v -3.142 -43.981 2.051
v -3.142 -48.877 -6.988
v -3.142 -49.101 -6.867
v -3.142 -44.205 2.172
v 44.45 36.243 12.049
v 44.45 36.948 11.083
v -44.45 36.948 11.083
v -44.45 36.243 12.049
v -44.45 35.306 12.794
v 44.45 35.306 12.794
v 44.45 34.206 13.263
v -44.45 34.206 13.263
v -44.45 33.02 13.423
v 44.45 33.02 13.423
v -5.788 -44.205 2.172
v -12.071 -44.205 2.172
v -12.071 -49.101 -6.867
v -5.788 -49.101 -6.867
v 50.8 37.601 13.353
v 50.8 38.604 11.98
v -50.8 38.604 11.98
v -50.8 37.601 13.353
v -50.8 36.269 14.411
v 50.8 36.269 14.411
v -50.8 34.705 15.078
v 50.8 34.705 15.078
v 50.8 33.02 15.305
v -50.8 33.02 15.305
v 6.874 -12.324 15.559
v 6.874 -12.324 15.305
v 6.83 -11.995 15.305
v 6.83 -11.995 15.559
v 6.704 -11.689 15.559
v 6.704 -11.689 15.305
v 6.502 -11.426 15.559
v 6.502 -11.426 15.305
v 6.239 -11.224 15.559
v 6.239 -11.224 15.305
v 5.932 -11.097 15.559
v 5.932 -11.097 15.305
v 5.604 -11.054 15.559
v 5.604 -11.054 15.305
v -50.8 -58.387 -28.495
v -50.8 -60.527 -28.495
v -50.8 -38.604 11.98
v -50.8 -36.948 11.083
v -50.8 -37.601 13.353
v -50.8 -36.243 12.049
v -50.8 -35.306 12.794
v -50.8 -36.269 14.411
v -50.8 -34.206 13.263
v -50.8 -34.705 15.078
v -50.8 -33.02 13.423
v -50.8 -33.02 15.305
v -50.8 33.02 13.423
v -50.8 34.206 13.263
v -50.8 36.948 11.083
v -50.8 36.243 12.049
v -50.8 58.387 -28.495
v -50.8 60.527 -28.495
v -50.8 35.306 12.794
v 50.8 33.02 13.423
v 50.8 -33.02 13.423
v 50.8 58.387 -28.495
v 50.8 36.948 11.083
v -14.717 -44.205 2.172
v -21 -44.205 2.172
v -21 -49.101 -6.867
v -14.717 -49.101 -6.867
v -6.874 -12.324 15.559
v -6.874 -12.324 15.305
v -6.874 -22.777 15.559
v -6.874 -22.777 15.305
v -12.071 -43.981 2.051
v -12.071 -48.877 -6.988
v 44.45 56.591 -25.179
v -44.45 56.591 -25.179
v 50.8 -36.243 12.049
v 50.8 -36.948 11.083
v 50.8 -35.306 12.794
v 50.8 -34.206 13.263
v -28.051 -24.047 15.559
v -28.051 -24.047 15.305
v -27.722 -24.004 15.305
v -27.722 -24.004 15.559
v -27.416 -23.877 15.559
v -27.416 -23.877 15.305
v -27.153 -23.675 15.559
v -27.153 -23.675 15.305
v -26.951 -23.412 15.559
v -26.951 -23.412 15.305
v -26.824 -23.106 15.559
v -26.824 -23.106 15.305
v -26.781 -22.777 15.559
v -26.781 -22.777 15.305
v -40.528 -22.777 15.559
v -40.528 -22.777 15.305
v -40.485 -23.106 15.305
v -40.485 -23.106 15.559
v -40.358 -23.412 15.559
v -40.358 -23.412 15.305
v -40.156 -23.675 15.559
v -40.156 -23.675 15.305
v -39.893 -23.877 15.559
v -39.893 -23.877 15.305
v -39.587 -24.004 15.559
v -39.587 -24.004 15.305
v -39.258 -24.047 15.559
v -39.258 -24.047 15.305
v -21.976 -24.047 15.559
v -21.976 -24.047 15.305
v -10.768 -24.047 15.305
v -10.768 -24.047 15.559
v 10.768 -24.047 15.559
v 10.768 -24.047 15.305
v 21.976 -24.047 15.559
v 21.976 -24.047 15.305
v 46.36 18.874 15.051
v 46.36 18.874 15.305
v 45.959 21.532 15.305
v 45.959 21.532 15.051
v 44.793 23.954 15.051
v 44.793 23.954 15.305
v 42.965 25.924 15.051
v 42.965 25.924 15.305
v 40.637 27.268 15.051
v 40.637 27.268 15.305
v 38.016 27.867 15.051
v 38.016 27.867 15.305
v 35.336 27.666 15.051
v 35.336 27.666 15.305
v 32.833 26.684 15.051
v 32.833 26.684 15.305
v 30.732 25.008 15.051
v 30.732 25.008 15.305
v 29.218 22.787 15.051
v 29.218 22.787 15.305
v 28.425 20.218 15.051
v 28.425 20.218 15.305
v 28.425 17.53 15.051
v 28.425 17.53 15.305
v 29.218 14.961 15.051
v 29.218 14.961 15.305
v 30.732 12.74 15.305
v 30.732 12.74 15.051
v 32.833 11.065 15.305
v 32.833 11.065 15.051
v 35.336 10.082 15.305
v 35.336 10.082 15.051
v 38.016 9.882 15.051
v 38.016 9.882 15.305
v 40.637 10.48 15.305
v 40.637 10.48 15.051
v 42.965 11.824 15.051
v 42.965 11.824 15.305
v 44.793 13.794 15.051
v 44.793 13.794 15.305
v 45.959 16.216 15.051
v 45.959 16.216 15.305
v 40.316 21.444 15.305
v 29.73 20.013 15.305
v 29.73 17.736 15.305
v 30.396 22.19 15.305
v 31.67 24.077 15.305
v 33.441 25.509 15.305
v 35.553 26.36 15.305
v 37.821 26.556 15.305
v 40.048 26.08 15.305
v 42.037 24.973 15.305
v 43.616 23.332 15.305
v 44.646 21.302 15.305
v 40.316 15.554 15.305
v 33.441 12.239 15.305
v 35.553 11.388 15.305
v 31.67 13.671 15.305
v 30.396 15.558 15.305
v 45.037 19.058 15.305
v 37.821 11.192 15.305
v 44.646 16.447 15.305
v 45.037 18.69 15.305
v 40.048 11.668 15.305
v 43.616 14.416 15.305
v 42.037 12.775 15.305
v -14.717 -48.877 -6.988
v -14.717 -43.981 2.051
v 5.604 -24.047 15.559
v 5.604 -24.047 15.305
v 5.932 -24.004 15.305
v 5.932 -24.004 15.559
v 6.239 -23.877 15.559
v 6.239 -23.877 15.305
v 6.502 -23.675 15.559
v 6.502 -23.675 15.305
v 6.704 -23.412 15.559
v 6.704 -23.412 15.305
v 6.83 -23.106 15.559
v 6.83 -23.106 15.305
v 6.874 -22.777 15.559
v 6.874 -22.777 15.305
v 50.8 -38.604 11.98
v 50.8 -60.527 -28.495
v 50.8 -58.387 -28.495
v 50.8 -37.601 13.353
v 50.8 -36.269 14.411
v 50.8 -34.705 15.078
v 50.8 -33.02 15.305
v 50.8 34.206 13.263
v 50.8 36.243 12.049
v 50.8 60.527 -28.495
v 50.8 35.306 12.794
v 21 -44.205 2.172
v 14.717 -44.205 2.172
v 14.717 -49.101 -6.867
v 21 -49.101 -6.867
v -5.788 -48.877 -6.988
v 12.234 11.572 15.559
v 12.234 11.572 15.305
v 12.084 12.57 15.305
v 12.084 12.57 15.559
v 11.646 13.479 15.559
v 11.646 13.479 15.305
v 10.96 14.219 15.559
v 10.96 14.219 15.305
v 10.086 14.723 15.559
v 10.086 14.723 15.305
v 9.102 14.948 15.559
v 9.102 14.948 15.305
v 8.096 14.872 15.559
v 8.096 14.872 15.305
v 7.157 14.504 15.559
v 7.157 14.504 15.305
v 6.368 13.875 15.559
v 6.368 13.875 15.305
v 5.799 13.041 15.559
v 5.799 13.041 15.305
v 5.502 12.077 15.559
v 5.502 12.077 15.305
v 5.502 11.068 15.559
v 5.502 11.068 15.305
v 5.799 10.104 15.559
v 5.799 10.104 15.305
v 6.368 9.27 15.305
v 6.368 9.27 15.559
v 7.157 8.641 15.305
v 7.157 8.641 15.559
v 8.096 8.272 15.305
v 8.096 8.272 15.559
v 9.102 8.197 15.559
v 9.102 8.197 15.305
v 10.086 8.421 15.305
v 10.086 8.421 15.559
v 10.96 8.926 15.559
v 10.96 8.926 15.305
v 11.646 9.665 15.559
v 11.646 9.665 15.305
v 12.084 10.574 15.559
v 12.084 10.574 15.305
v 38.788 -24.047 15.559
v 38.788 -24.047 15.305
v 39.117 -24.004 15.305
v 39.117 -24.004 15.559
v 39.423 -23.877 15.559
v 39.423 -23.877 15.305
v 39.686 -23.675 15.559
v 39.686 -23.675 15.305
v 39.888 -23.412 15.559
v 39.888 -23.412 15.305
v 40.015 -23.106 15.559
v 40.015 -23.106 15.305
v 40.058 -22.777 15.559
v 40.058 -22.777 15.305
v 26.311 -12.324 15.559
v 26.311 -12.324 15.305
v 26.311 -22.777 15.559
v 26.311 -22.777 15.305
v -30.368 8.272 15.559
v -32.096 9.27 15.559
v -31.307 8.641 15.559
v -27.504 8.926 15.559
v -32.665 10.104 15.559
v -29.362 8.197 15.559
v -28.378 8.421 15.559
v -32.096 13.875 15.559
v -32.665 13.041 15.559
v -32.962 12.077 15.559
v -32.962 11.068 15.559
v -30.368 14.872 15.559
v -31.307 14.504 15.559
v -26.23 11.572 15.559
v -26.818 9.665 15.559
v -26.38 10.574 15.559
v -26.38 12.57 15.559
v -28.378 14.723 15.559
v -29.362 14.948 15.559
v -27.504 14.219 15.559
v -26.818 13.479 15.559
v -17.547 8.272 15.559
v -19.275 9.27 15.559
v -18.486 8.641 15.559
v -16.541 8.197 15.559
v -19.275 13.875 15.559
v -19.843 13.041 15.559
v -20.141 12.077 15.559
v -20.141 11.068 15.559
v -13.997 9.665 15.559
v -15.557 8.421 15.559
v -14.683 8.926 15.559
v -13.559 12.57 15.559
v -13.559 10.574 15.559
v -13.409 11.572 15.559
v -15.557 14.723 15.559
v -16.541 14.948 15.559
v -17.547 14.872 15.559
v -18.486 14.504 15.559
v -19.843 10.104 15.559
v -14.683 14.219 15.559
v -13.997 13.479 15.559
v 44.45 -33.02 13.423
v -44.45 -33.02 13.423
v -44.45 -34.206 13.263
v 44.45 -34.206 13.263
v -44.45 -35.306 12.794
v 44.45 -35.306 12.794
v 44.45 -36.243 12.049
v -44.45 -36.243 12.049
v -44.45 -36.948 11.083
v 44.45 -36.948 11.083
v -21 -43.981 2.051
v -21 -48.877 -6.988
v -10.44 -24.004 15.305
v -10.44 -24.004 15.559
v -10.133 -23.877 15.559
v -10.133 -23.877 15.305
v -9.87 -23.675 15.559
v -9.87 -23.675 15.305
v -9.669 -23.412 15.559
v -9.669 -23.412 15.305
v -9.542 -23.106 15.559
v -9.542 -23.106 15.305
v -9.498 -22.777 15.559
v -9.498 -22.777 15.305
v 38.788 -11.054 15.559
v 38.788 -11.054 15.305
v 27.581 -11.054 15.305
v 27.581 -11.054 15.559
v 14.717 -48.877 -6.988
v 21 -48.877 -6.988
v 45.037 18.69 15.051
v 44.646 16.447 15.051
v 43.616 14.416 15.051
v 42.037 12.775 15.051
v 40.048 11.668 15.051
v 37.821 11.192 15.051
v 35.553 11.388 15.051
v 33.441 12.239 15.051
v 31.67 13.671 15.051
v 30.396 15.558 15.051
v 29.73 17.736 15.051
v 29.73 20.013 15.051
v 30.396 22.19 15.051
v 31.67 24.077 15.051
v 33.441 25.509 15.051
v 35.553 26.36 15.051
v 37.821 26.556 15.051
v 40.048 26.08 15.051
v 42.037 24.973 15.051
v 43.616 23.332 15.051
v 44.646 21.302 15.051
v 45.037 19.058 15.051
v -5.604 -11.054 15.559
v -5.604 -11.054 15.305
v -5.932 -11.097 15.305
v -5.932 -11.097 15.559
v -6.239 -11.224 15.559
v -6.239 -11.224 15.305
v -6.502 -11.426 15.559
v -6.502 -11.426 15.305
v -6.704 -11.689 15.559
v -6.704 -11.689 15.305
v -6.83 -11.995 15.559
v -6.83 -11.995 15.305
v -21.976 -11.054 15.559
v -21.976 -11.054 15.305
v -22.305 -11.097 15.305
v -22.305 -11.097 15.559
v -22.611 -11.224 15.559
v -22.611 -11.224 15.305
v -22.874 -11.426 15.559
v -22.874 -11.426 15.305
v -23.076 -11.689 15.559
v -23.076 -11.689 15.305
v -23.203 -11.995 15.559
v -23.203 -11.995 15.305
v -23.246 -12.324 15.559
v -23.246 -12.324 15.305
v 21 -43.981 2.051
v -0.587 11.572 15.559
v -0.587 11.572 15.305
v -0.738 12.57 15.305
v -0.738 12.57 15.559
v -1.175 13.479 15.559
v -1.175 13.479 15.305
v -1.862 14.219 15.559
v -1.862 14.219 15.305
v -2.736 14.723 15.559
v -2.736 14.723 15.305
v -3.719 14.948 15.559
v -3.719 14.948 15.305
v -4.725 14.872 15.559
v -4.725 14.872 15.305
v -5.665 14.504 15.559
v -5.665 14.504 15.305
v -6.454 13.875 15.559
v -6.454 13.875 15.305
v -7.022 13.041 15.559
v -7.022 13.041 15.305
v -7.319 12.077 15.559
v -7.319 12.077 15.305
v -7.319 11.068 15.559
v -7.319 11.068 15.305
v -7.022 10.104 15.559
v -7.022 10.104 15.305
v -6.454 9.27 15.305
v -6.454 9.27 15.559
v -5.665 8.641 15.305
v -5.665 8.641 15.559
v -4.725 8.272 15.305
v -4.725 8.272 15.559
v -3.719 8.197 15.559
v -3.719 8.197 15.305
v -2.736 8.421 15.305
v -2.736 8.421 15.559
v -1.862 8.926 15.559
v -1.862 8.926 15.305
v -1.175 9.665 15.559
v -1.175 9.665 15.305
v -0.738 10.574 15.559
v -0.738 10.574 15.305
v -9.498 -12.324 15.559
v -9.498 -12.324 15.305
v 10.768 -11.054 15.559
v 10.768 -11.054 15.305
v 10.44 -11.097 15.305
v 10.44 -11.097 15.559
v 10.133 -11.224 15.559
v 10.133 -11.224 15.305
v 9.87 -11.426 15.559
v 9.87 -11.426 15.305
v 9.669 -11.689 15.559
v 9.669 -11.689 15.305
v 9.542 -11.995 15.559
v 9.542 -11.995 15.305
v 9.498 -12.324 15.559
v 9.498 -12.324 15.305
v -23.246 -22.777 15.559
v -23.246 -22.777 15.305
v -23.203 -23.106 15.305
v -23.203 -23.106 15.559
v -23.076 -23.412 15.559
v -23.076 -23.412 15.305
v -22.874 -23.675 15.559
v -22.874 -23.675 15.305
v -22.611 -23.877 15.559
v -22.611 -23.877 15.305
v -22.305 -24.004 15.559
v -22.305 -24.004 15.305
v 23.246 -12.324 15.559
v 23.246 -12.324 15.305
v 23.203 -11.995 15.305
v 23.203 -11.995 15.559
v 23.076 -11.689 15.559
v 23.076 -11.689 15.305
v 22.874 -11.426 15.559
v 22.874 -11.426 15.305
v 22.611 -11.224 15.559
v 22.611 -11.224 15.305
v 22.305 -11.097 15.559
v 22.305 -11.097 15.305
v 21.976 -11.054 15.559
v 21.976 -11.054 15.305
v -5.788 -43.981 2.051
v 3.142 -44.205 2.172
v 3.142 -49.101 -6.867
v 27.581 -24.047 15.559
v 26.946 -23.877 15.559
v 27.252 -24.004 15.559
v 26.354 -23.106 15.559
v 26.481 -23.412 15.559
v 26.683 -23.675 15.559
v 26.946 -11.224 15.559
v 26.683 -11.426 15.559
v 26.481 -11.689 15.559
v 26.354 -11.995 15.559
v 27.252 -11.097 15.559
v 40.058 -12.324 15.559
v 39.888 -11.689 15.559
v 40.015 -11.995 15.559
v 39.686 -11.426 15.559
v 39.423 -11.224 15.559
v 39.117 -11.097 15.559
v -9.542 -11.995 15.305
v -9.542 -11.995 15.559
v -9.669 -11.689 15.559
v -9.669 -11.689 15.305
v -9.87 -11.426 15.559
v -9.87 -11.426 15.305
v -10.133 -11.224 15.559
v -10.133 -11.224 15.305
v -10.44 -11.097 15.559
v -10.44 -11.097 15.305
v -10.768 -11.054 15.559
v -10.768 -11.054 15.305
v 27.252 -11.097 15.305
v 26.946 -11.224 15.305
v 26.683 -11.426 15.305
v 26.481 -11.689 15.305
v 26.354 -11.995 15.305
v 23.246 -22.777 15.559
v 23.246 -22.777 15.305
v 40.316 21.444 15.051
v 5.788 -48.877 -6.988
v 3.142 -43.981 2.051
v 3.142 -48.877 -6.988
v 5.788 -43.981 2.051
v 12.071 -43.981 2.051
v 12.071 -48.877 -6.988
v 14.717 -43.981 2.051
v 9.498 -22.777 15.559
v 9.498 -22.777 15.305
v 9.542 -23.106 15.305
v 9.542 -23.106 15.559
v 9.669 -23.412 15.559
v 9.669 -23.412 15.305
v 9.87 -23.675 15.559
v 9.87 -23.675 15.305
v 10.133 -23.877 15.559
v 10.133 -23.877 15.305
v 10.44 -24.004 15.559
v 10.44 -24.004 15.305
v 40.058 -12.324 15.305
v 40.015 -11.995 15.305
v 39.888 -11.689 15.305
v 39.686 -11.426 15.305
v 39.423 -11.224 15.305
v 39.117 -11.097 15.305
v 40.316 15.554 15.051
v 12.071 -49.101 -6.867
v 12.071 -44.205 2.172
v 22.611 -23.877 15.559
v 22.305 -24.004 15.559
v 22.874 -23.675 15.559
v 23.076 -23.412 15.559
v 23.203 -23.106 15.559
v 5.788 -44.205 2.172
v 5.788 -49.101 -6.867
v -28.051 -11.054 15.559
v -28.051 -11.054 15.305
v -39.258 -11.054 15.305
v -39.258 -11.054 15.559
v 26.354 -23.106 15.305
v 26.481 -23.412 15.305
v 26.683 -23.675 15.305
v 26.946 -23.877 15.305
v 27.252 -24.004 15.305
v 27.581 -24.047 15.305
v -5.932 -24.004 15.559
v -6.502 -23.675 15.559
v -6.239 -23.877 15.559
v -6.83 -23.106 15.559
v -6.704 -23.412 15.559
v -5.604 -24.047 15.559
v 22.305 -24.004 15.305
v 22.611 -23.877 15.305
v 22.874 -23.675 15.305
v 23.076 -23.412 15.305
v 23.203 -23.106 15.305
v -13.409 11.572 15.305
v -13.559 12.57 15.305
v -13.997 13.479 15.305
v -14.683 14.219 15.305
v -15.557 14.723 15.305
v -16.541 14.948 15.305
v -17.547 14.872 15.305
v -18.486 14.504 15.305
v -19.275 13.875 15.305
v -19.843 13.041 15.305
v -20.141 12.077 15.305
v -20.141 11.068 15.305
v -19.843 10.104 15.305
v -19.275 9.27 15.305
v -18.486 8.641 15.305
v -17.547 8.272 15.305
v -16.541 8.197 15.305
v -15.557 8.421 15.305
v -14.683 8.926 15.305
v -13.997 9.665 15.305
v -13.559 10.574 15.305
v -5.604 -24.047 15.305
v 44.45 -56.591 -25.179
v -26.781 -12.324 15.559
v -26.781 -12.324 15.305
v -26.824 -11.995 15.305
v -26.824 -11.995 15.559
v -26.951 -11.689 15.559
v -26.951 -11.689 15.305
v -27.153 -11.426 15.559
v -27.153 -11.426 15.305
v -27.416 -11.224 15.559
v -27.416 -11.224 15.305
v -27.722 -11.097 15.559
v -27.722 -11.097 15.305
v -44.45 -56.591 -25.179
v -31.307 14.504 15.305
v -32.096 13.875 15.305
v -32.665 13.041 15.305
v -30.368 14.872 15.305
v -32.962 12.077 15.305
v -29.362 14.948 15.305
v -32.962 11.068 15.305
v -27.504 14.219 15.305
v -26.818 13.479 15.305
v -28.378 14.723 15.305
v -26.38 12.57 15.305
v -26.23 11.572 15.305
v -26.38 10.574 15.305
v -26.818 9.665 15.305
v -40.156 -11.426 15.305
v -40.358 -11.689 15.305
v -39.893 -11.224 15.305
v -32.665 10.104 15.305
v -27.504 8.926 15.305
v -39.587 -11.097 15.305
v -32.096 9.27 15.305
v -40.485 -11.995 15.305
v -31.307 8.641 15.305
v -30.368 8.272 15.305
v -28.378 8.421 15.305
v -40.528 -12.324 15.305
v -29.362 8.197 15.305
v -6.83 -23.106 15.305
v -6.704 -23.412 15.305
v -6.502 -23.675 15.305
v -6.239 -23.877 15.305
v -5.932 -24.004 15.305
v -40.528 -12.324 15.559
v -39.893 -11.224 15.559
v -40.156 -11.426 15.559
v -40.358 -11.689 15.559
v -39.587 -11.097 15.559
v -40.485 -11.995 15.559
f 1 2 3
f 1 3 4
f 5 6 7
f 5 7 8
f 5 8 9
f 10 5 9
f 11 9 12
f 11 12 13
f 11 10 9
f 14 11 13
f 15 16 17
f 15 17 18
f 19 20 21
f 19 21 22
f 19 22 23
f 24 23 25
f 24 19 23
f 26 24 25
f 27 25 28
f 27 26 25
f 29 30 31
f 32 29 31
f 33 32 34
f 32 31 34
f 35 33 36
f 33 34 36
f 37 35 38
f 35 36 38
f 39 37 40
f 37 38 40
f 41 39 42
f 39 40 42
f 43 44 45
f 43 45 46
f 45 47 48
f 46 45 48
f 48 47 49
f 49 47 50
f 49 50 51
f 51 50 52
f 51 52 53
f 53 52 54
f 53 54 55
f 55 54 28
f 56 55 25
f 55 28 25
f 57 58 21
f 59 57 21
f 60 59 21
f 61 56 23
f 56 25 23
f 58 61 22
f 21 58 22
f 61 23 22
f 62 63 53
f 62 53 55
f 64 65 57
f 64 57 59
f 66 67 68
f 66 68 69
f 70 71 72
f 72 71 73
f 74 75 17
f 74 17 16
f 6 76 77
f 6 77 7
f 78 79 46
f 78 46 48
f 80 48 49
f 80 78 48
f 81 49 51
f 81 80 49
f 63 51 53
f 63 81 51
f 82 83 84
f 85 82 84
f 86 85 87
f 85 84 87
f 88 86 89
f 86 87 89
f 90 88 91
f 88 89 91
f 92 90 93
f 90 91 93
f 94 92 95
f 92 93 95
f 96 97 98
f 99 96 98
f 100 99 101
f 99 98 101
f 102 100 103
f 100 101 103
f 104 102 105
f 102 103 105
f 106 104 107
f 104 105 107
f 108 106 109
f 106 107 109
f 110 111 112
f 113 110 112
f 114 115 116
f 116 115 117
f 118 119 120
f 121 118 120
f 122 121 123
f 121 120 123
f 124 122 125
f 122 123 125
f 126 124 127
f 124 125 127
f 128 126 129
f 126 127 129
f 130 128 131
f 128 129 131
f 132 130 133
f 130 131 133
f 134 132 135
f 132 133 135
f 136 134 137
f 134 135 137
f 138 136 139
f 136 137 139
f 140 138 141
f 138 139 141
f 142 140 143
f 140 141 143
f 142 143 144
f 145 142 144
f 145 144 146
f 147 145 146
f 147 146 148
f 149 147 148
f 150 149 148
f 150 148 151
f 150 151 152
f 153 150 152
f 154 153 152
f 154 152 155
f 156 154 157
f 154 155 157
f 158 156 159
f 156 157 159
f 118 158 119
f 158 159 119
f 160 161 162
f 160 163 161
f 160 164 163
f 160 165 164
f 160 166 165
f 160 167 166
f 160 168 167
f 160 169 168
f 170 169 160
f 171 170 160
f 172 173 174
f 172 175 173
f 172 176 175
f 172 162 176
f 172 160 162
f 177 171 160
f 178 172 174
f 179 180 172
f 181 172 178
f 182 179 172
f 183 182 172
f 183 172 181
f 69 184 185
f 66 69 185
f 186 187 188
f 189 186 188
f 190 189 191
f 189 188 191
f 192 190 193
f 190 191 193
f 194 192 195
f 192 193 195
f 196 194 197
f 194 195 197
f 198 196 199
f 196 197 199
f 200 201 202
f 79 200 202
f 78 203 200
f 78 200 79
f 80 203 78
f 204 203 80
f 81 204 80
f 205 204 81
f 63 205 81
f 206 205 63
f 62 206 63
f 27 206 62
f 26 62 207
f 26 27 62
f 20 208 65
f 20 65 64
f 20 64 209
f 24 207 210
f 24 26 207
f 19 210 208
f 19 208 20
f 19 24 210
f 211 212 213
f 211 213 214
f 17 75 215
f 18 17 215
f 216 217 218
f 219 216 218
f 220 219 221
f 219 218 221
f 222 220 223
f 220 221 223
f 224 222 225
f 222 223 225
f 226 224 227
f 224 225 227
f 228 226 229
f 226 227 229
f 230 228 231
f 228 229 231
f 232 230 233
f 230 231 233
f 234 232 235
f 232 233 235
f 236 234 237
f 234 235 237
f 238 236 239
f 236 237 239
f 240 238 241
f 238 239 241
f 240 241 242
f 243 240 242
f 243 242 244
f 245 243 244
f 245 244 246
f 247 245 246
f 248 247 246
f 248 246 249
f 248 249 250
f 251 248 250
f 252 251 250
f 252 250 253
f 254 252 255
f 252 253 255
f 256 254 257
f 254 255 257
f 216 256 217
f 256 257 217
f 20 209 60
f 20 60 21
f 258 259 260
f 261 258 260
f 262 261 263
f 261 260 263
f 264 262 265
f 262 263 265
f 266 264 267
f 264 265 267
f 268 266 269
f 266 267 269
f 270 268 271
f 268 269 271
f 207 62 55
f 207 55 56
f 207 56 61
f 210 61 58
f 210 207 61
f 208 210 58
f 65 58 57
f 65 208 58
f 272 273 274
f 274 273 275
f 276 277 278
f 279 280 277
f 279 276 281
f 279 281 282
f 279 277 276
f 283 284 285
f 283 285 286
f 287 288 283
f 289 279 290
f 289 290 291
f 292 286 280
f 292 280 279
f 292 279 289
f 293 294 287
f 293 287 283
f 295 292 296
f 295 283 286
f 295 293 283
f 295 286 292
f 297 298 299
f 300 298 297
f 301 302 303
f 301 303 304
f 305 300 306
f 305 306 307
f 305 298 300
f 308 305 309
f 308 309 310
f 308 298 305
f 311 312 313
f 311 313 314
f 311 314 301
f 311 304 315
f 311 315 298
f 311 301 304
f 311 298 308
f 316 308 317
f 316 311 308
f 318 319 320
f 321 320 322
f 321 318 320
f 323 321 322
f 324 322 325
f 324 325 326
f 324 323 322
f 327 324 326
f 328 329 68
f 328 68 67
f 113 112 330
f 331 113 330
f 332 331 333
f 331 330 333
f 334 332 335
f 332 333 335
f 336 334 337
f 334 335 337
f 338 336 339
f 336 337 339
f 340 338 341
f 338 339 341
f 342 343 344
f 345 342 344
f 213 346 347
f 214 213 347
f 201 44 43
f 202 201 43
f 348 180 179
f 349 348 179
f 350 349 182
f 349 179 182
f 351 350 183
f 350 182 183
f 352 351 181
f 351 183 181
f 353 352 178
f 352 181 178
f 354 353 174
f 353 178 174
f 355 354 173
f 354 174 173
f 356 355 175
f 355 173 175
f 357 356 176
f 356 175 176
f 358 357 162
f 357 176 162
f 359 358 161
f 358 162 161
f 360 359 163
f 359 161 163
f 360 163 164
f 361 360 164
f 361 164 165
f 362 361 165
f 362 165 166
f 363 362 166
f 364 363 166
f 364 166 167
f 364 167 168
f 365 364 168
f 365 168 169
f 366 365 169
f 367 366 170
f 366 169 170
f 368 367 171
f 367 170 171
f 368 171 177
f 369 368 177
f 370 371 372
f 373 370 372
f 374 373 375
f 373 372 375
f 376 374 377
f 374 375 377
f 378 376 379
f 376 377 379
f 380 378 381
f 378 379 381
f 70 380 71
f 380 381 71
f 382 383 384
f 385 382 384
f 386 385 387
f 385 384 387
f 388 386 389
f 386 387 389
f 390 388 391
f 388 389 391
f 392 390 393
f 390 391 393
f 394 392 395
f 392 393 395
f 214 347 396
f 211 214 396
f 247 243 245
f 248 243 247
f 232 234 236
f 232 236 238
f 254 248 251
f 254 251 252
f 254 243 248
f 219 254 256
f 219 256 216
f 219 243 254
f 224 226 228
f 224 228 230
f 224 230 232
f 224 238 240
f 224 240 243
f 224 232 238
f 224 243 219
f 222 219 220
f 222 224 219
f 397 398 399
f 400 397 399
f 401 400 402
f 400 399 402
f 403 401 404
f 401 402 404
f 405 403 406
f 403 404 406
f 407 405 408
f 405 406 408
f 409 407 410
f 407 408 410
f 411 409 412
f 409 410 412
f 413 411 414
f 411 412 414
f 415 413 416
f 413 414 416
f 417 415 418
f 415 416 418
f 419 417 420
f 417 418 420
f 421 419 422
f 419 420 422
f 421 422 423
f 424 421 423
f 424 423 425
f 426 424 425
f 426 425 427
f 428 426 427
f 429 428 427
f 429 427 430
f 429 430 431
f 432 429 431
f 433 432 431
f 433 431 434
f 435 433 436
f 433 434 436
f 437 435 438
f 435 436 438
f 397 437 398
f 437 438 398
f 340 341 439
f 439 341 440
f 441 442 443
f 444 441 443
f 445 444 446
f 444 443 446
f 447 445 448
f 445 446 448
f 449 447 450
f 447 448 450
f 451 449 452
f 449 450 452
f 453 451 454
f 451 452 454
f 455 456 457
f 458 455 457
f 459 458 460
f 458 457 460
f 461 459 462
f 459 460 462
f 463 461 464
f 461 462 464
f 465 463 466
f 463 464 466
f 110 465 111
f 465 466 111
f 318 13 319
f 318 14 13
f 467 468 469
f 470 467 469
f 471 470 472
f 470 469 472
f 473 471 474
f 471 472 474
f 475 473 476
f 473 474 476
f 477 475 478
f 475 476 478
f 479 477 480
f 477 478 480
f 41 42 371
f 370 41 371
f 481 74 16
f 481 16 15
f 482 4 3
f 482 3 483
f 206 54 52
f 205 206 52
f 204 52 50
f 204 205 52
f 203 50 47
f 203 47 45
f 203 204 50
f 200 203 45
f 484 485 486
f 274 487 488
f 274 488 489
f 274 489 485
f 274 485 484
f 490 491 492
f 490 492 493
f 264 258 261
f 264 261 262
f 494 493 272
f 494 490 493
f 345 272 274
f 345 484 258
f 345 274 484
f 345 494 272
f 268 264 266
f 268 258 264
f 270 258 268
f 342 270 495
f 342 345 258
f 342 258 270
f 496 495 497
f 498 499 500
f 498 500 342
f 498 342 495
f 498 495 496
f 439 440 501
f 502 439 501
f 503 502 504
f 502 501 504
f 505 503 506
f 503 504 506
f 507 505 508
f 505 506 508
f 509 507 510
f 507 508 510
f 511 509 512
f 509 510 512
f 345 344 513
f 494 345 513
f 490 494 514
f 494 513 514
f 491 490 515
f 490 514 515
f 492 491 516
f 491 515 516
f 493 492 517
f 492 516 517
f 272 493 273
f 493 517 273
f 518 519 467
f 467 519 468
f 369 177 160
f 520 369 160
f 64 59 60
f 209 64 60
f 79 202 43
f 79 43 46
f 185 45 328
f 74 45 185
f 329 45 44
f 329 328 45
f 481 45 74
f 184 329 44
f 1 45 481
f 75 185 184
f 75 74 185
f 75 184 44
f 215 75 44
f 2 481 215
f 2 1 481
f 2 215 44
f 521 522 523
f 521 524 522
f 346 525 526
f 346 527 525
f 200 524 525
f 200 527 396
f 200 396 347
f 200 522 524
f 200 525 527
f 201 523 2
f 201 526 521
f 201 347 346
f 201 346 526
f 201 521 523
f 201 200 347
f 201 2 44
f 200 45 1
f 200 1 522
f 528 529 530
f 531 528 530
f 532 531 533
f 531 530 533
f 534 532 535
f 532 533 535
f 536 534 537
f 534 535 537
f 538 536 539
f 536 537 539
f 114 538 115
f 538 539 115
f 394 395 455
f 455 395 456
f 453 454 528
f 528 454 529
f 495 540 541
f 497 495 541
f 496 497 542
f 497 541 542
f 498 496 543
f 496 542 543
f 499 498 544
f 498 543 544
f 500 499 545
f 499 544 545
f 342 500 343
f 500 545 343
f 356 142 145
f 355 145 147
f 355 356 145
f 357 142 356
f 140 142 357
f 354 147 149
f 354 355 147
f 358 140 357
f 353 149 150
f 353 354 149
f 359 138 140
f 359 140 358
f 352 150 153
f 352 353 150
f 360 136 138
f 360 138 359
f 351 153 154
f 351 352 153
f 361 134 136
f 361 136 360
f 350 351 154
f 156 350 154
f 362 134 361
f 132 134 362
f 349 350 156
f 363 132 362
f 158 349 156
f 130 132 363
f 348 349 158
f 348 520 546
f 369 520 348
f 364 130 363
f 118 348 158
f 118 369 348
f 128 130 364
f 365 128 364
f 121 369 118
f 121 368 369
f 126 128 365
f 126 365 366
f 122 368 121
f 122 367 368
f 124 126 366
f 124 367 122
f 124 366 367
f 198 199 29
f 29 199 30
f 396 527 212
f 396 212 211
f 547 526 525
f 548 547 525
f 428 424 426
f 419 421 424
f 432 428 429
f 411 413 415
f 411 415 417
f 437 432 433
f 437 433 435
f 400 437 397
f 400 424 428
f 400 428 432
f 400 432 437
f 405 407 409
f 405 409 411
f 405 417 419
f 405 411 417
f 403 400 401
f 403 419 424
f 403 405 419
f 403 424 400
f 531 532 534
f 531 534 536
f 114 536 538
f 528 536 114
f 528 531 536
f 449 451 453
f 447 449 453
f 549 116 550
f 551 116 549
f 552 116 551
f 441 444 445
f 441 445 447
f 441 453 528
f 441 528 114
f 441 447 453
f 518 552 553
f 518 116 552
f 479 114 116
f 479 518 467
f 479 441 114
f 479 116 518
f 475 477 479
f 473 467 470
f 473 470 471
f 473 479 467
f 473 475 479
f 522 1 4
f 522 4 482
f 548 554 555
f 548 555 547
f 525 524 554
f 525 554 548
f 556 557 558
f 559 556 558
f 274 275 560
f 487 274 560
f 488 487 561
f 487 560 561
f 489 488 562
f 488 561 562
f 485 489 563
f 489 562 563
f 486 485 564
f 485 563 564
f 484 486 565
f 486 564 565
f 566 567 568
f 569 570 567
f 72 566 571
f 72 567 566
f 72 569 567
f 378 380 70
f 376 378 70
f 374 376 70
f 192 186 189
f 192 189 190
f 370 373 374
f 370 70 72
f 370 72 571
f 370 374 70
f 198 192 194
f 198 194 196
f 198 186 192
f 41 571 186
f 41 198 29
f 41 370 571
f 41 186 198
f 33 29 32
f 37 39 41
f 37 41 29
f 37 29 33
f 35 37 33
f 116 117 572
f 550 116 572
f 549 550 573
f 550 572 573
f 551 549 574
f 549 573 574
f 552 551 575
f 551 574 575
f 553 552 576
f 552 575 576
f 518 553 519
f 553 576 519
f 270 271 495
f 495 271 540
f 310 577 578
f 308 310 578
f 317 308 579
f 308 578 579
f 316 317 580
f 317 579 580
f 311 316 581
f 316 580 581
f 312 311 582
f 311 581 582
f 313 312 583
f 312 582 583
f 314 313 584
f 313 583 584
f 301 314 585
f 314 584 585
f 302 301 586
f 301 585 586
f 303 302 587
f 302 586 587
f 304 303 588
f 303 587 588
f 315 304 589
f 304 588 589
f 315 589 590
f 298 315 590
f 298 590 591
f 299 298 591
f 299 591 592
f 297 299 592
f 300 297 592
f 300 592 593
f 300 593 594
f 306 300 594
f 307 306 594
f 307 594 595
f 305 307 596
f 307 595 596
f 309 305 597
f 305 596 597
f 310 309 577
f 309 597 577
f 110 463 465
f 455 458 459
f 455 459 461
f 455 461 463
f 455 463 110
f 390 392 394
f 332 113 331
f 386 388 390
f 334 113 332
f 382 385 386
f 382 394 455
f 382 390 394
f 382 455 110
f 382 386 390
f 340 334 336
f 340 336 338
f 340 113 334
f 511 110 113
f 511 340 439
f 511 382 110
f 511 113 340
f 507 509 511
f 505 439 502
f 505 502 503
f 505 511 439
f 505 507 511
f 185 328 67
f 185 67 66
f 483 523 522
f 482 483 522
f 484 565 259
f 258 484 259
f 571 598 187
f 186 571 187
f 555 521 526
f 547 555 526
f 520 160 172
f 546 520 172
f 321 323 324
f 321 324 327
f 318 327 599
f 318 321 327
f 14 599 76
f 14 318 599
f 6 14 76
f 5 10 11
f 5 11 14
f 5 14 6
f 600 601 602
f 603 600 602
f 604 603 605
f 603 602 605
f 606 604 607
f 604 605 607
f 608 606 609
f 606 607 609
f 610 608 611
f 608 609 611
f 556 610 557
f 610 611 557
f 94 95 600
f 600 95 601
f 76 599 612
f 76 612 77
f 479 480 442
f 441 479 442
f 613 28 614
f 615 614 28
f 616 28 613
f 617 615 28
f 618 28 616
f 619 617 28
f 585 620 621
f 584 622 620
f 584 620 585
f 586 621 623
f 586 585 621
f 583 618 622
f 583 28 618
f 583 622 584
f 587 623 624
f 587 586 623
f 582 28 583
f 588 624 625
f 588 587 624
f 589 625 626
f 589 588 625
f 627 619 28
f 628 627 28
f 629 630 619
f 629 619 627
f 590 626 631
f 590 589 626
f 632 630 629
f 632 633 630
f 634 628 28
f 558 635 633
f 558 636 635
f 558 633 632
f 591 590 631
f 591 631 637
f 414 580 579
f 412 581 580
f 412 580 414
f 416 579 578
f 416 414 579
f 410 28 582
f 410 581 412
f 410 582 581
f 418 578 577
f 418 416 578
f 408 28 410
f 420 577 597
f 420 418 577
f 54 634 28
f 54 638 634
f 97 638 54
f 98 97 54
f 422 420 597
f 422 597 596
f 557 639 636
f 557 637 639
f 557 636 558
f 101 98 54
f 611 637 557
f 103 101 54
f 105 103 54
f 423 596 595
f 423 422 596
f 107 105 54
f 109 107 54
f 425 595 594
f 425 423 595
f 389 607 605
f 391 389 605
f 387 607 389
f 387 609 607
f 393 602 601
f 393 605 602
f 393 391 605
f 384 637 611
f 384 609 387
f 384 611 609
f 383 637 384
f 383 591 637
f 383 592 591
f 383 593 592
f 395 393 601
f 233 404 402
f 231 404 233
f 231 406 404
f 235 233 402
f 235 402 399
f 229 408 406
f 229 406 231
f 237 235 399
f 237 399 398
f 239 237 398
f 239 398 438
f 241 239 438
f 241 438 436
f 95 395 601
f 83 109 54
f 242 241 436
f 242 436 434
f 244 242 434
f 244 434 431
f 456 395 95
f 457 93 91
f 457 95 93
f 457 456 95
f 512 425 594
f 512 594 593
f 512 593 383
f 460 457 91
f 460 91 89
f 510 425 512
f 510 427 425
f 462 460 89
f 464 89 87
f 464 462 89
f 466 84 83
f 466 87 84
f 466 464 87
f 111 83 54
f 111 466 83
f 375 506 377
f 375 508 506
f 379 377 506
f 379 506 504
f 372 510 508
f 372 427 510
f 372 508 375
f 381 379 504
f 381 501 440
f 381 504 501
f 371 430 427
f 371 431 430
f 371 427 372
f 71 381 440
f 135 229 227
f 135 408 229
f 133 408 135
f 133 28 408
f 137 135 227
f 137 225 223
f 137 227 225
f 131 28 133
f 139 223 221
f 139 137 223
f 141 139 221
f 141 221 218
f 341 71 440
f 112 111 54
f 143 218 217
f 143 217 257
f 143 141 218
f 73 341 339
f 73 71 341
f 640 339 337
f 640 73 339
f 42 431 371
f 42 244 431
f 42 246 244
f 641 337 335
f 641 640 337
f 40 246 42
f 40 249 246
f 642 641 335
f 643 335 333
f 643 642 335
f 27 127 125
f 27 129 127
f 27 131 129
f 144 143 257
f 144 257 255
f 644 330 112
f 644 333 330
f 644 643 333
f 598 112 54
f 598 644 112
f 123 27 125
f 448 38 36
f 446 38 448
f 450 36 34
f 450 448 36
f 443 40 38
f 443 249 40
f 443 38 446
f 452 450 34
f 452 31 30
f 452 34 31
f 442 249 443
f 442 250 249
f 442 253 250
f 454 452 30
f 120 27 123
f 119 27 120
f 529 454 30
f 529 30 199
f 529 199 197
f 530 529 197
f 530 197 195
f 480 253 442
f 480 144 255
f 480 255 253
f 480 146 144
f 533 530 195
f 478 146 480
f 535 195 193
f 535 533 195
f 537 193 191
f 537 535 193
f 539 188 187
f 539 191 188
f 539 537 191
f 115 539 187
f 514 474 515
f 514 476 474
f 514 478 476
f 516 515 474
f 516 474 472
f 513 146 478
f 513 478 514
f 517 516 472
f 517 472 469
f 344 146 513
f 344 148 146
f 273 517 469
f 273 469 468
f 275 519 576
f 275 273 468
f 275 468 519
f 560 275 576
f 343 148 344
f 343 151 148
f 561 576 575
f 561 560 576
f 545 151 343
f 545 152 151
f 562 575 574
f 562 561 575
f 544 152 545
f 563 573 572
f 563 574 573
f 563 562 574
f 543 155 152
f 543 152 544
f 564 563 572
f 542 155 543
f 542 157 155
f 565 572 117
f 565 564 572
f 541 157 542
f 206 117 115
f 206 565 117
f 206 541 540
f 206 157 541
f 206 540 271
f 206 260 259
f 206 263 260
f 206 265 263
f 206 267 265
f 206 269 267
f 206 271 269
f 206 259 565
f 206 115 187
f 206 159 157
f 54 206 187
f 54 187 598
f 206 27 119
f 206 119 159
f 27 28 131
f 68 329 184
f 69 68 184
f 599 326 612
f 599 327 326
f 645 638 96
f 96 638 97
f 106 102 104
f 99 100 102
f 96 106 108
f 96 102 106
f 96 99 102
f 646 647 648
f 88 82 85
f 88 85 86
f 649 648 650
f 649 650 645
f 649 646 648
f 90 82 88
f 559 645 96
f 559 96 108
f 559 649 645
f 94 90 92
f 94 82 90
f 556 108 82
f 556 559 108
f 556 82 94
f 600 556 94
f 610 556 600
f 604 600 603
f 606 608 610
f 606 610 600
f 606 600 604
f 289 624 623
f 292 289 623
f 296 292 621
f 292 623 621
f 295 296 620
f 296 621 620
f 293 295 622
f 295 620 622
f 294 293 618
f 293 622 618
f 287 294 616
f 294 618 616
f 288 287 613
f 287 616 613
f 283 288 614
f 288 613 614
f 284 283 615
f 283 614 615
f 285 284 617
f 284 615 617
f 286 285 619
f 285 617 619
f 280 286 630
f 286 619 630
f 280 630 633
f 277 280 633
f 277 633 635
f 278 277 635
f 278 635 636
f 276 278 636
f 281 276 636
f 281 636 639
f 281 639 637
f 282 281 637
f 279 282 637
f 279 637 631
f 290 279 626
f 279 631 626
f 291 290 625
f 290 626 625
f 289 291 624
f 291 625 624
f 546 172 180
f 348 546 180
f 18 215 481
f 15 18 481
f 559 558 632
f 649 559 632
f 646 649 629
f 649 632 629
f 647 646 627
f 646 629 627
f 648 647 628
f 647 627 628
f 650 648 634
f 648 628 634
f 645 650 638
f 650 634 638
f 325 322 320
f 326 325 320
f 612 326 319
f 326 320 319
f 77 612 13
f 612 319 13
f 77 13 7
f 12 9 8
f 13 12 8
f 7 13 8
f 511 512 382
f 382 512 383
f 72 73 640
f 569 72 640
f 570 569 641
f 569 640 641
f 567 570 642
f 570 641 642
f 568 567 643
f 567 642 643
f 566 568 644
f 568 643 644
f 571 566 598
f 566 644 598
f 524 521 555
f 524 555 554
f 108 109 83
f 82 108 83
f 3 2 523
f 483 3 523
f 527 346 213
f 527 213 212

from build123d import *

# Parameters (mm, degrees)
F2_DEPTH  = 50.8
F4_W      = 6.283306625
F4_H      = 10.2798976004
F5_DEPTH  = 0.254
F7_DEPTH  = 0.254
F9_DEPTH  = 44.45
F10_R     = 3.3849263003
F11_DEPTH = 0.254
F12_R     = 9.0176977482
F13_DEPTH = 0.254


# Not quite as in the source:
# - a feature names something its author has since deleted; it is built from what else it names
# - the program builds the solid bodies; features that only make, move or delete a surface that nothing else refers to are left out


with BuildPart() as f2:
    # F1 (on Right) → F2 (new body, symmetric)
    with BuildSketch(Plane.YZ):
        with BuildLine():
            Line((-38.6035041166, 11.9795769261), (-60.5272354513, -28.4950081259))
            Line((-60.5272354513, -28.4950081259), (-58.3865008404, -28.4950081259))
            Line((-58.3865008404, -28.4950081259), (-36.9483857369, 11.0830545618))
            ThreePointArc((-36.9483857369, 11.0830545618), (-35.3062004297, 12.7935845395), (-33.02, 13.4228483819))
            Line((-33.02, 13.4228483819), (-7.4128283233, 13.4228483819))
            Line((-7.4128283233, 13.4228483819), (7.4128283233, 13.4228483819))
            Line((7.4128283233, 13.4228483819), (33.02, 13.4228483819))
            ThreePointArc((33.02, 13.4228483819), (35.3062004297, 12.7935845395), (36.9483857369, 11.0830545618))
            Line((36.9483857369, 11.0830545618), (58.3865008404, -28.4950081259))
            Line((58.3865008404, -28.4950081259), (60.5272354513, -28.4950081259))
            Line((60.5272354513, -28.4950081259), (38.6035041166, 11.9795769261))
            ThreePointArc((38.6035041166, 11.9795769261), (36.2694287388, 14.4107921406), (33.02, 15.3051791713))
            Line((33.02, 15.3051791713), (0, 15.3051791713))
            Line((0, 15.3051791713), (-33.02, 15.3051791713))
            ThreePointArc((-33.02, 15.3051791713), (-36.2694287388, 14.4107921406), (-38.6035041166, 11.9795769261))
        make_face()
    extrude(amount=F2_DEPTH, both=True)

    # F4 (on face) → F5 (join)
    with BuildSketch(Plane(origin=(0, -34.8634190503, 18.8843500603), x_dir=(1, 0, 0), z_dir=(0, -0.8792919869, 0.476283111))):
        with Locations((-17.8583269549, -24.2836587131)):
            Rectangle(F4_W, F4_H)
        with Locations((-8.9291634774, -24.2836587131)):
            Rectangle(F4_W, F4_H)
        with Locations((0, -24.2836587131)):
            Rectangle(F4_W, F4_H)
        with Locations((8.9291634774, -24.2836587131)):
            Rectangle(F4_W, F4_H)
        with Locations((17.8583269549, -24.2836587131)):
            Rectangle(F4_W, F4_H)
    extrude(amount=F5_DEPTH)

    # F6 (on face) → F7 (join)
    with BuildSketch(Plane.XY.offset(15.3051791713)):
        with BuildLine():
            Line((-28.0506481811, -11.053937773), (-39.258038976, -11.053937773))
            ThreePointArc((-39.258038976, -11.053937773), (-40.1560645881, -11.4259121609), (-40.528038976, -12.323937773))
            Line((-40.528038976, -12.323937773), (-40.528038976, -22.7773072362))
            ThreePointArc((-40.528038976, -22.7773072362), (-40.1560645881, -23.6753328483), (-39.258038976, -24.0473072362))
            Line((-39.258038976, -24.0473072362), (-28.0506481811, -24.0473072362))
            ThreePointArc((-28.0506481811, -24.0473072362), (-27.152622569, -23.6753328483), (-26.7806481811, -22.7773072362))
            Line((-26.7806481811, -22.7773072362), (-26.7806481811, -12.323937773))
            ThreePointArc((-26.7806481811, -12.323937773), (-27.152622569, -11.4259121609), (-28.0506481811, -11.053937773))
        make_face()
        with BuildLine():
            Line((-10.7684130521, -11.053937773), (-21.9758038469, -11.053937773))
            ThreePointArc((-21.9758038469, -11.053937773), (-22.873829459, -11.4259121609), (-23.2458038469, -12.323937773))
            Line((-23.2458038469, -12.323937773), (-23.2458038469, -22.7773072362))
            ThreePointArc((-23.2458038469, -22.7773072362), (-22.873829459, -23.6753328483), (-21.9758038469, -24.0473072362))
            Line((-21.9758038469, -24.0473072362), (-10.7684130521, -24.0473072362))
            ThreePointArc((-10.7684130521, -24.0473072362), (-9.87038744, -23.6753328483), (-9.4984130521, -22.7773072362))
            Line((-9.4984130521, -22.7773072362), (-9.4984130521, -12.323937773))
            ThreePointArc((-9.4984130521, -12.323937773), (-9.87038744, -11.4259121609), (-10.7684130521, -11.053937773))
        make_face()
        with BuildLine():
            Line((5.6036953974, -11.053937773), (-5.6036953974, -11.053937773))
            ThreePointArc((-5.6036953974, -11.053937773), (-6.5017210095, -11.4259121609), (-6.8736953974, -12.323937773))
            Line((-6.8736953974, -12.323937773), (-6.8736953974, -22.7773072362))
            ThreePointArc((-6.8736953974, -22.7773072362), (-6.5017210095, -23.6753328483), (-5.6036953974, -24.0473072362))
            Line((-5.6036953974, -24.0473072362), (5.6036953974, -24.0473072362))
            ThreePointArc((5.6036953974, -24.0473072362), (6.5017210095, -23.6753328483), (6.8736953974, -22.7773072362))
            Line((6.8736953974, -22.7773072362), (6.8736953974, -12.323937773))
            ThreePointArc((6.8736953974, -12.323937773), (6.5017210095, -11.4259121609), (5.6036953974, -11.053937773))
        make_face()
        with BuildLine():
            Line((21.9758038469, -11.053937773), (10.7684130521, -11.053937773))
            ThreePointArc((10.7684130521, -11.053937773), (9.87038744, -11.4259121609), (9.4984130521, -12.323937773))
            Line((9.4984130521, -12.323937773), (9.4984130521, -22.7773072362))
            ThreePointArc((9.4984130521, -22.7773072362), (9.87038744, -23.6753328483), (10.7684130521, -24.0473072362))
            Line((10.7684130521, -24.0473072362), (21.9758038469, -24.0473072362))
            ThreePointArc((21.9758038469, -24.0473072362), (22.873829459, -23.6753328483), (23.2458038469, -22.7773072362))
            Line((23.2458038469, -22.7773072362), (23.2458038469, -12.323937773))
            ThreePointArc((23.2458038469, -12.323937773), (22.873829459, -11.4259121609), (21.9758038469, -11.053937773))
        make_face()
        with BuildLine():
            Line((38.7882444791, -11.053937773), (27.5808536842, -11.053937773))
            ThreePointArc((27.5808536842, -11.053937773), (26.6828280721, -11.4259121609), (26.3108536842, -12.323937773))
            Line((26.3108536842, -12.323937773), (26.3108536842, -22.7773072362))
            ThreePointArc((26.3108536842, -22.7773072362), (26.6828280721, -23.6753328483), (27.5808536842, -24.0473072362))
            Line((27.5808536842, -24.0473072362), (38.7882444791, -24.0473072362))
            ThreePointArc((38.7882444791, -24.0473072362), (39.6862700912, -23.6753328483), (40.0582444791, -22.7773072362))
            Line((40.0582444791, -22.7773072362), (40.0582444791, -12.323937773))
            ThreePointArc((40.0582444791, -12.323937773), (39.6862700912, -11.4259121609), (38.7882444791, -11.053937773))
        make_face()
    extrude(amount=F7_DEPTH)

    # F10 (on face) → F11 (join)
    with BuildSketch(Plane.XY.offset(15.3051791713)):
        with Locations((-29.6148993075, 11.5722091869)):
            Circle(F10_R)
        with Locations((-16.793559286, 11.5722091869)):
            Circle(F10_R)
        with Locations((-3.9722192645, 11.5722091869)):
            Circle(F10_R)
        with Locations((8.849120757, 11.5722091869)):
            Circle(F10_R)
    extrude(amount=F11_DEPTH)

    # F12 (on face) → F13 (cut)
    with BuildSketch(Plane.XY.offset(15.3051791713)):
        with Locations((37.3422021844, 18.8740905886)):
            Circle(F12_R)
        with BuildLine():
            ThreePointArc((45.0367882661, 19.0583374351), (45.0384424307, 18.9662206123), (45.0389938452, 18.8740905886))
            ThreePointArc((45.0389938452, 18.8740905886), (45.0384424307, 18.781960565), (45.0367882661, 18.6898437421))
            ThreePointArc((45.0367882661, 18.6898437421), (29.6454105237, 18.8740905886), (45.0367882661, 19.0583374351))
        make_face(mode=Mode.SUBTRACT)
        with BuildLine():
            ThreePointArc((45.0367882661, 18.6898437421), (45.0384424307, 18.781960565), (45.0389938452, 18.8740905886))
            ThreePointArc((45.0389938452, 18.8740905886), (45.0384424307, 18.9662206123), (45.0367882661, 19.0583374351))
            Line((45.0367882661, 19.0583374351), (40.3160825372, 21.4442182332))
            Line((40.3160825372, 21.4442182332), (40.3160825372, 15.5540443957))
            Line((40.3160825372, 15.5540443957), (45.0367882661, 18.6898437421))
        make_face()
    extrude(amount=-F13_DEPTH, mode=Mode.SUBTRACT)


with BuildPart() as f9:
    # F8 (on Right) → F9 (new body, symmetric)
    with BuildSketch(Plane.YZ):
        with BuildLine():
            Line((-36.9483857369, 11.0830545618), (-56.5905375594, -25.1793832691))
            Line((-56.5905375594, -25.1793832691), (56.5905375594, -25.1793832691))
            Line((56.5905375594, -25.1793832691), (36.9483857369, 11.0830545618))
            ThreePointArc((36.9483857369, 11.0830545618), (35.3062004297, 12.7935845395), (33.02, 13.4228483819))
            Line((33.02, 13.4228483819), (-33.02, 13.4228483819))
            ThreePointArc((-33.02, 13.4228483819), (-35.3062004297, 12.7935845395), (-36.9483857369, 11.0830545618))
        make_face()
    extrude(amount=F9_DEPTH, both=True)


solid = Compound([f2.part, f9.part])
